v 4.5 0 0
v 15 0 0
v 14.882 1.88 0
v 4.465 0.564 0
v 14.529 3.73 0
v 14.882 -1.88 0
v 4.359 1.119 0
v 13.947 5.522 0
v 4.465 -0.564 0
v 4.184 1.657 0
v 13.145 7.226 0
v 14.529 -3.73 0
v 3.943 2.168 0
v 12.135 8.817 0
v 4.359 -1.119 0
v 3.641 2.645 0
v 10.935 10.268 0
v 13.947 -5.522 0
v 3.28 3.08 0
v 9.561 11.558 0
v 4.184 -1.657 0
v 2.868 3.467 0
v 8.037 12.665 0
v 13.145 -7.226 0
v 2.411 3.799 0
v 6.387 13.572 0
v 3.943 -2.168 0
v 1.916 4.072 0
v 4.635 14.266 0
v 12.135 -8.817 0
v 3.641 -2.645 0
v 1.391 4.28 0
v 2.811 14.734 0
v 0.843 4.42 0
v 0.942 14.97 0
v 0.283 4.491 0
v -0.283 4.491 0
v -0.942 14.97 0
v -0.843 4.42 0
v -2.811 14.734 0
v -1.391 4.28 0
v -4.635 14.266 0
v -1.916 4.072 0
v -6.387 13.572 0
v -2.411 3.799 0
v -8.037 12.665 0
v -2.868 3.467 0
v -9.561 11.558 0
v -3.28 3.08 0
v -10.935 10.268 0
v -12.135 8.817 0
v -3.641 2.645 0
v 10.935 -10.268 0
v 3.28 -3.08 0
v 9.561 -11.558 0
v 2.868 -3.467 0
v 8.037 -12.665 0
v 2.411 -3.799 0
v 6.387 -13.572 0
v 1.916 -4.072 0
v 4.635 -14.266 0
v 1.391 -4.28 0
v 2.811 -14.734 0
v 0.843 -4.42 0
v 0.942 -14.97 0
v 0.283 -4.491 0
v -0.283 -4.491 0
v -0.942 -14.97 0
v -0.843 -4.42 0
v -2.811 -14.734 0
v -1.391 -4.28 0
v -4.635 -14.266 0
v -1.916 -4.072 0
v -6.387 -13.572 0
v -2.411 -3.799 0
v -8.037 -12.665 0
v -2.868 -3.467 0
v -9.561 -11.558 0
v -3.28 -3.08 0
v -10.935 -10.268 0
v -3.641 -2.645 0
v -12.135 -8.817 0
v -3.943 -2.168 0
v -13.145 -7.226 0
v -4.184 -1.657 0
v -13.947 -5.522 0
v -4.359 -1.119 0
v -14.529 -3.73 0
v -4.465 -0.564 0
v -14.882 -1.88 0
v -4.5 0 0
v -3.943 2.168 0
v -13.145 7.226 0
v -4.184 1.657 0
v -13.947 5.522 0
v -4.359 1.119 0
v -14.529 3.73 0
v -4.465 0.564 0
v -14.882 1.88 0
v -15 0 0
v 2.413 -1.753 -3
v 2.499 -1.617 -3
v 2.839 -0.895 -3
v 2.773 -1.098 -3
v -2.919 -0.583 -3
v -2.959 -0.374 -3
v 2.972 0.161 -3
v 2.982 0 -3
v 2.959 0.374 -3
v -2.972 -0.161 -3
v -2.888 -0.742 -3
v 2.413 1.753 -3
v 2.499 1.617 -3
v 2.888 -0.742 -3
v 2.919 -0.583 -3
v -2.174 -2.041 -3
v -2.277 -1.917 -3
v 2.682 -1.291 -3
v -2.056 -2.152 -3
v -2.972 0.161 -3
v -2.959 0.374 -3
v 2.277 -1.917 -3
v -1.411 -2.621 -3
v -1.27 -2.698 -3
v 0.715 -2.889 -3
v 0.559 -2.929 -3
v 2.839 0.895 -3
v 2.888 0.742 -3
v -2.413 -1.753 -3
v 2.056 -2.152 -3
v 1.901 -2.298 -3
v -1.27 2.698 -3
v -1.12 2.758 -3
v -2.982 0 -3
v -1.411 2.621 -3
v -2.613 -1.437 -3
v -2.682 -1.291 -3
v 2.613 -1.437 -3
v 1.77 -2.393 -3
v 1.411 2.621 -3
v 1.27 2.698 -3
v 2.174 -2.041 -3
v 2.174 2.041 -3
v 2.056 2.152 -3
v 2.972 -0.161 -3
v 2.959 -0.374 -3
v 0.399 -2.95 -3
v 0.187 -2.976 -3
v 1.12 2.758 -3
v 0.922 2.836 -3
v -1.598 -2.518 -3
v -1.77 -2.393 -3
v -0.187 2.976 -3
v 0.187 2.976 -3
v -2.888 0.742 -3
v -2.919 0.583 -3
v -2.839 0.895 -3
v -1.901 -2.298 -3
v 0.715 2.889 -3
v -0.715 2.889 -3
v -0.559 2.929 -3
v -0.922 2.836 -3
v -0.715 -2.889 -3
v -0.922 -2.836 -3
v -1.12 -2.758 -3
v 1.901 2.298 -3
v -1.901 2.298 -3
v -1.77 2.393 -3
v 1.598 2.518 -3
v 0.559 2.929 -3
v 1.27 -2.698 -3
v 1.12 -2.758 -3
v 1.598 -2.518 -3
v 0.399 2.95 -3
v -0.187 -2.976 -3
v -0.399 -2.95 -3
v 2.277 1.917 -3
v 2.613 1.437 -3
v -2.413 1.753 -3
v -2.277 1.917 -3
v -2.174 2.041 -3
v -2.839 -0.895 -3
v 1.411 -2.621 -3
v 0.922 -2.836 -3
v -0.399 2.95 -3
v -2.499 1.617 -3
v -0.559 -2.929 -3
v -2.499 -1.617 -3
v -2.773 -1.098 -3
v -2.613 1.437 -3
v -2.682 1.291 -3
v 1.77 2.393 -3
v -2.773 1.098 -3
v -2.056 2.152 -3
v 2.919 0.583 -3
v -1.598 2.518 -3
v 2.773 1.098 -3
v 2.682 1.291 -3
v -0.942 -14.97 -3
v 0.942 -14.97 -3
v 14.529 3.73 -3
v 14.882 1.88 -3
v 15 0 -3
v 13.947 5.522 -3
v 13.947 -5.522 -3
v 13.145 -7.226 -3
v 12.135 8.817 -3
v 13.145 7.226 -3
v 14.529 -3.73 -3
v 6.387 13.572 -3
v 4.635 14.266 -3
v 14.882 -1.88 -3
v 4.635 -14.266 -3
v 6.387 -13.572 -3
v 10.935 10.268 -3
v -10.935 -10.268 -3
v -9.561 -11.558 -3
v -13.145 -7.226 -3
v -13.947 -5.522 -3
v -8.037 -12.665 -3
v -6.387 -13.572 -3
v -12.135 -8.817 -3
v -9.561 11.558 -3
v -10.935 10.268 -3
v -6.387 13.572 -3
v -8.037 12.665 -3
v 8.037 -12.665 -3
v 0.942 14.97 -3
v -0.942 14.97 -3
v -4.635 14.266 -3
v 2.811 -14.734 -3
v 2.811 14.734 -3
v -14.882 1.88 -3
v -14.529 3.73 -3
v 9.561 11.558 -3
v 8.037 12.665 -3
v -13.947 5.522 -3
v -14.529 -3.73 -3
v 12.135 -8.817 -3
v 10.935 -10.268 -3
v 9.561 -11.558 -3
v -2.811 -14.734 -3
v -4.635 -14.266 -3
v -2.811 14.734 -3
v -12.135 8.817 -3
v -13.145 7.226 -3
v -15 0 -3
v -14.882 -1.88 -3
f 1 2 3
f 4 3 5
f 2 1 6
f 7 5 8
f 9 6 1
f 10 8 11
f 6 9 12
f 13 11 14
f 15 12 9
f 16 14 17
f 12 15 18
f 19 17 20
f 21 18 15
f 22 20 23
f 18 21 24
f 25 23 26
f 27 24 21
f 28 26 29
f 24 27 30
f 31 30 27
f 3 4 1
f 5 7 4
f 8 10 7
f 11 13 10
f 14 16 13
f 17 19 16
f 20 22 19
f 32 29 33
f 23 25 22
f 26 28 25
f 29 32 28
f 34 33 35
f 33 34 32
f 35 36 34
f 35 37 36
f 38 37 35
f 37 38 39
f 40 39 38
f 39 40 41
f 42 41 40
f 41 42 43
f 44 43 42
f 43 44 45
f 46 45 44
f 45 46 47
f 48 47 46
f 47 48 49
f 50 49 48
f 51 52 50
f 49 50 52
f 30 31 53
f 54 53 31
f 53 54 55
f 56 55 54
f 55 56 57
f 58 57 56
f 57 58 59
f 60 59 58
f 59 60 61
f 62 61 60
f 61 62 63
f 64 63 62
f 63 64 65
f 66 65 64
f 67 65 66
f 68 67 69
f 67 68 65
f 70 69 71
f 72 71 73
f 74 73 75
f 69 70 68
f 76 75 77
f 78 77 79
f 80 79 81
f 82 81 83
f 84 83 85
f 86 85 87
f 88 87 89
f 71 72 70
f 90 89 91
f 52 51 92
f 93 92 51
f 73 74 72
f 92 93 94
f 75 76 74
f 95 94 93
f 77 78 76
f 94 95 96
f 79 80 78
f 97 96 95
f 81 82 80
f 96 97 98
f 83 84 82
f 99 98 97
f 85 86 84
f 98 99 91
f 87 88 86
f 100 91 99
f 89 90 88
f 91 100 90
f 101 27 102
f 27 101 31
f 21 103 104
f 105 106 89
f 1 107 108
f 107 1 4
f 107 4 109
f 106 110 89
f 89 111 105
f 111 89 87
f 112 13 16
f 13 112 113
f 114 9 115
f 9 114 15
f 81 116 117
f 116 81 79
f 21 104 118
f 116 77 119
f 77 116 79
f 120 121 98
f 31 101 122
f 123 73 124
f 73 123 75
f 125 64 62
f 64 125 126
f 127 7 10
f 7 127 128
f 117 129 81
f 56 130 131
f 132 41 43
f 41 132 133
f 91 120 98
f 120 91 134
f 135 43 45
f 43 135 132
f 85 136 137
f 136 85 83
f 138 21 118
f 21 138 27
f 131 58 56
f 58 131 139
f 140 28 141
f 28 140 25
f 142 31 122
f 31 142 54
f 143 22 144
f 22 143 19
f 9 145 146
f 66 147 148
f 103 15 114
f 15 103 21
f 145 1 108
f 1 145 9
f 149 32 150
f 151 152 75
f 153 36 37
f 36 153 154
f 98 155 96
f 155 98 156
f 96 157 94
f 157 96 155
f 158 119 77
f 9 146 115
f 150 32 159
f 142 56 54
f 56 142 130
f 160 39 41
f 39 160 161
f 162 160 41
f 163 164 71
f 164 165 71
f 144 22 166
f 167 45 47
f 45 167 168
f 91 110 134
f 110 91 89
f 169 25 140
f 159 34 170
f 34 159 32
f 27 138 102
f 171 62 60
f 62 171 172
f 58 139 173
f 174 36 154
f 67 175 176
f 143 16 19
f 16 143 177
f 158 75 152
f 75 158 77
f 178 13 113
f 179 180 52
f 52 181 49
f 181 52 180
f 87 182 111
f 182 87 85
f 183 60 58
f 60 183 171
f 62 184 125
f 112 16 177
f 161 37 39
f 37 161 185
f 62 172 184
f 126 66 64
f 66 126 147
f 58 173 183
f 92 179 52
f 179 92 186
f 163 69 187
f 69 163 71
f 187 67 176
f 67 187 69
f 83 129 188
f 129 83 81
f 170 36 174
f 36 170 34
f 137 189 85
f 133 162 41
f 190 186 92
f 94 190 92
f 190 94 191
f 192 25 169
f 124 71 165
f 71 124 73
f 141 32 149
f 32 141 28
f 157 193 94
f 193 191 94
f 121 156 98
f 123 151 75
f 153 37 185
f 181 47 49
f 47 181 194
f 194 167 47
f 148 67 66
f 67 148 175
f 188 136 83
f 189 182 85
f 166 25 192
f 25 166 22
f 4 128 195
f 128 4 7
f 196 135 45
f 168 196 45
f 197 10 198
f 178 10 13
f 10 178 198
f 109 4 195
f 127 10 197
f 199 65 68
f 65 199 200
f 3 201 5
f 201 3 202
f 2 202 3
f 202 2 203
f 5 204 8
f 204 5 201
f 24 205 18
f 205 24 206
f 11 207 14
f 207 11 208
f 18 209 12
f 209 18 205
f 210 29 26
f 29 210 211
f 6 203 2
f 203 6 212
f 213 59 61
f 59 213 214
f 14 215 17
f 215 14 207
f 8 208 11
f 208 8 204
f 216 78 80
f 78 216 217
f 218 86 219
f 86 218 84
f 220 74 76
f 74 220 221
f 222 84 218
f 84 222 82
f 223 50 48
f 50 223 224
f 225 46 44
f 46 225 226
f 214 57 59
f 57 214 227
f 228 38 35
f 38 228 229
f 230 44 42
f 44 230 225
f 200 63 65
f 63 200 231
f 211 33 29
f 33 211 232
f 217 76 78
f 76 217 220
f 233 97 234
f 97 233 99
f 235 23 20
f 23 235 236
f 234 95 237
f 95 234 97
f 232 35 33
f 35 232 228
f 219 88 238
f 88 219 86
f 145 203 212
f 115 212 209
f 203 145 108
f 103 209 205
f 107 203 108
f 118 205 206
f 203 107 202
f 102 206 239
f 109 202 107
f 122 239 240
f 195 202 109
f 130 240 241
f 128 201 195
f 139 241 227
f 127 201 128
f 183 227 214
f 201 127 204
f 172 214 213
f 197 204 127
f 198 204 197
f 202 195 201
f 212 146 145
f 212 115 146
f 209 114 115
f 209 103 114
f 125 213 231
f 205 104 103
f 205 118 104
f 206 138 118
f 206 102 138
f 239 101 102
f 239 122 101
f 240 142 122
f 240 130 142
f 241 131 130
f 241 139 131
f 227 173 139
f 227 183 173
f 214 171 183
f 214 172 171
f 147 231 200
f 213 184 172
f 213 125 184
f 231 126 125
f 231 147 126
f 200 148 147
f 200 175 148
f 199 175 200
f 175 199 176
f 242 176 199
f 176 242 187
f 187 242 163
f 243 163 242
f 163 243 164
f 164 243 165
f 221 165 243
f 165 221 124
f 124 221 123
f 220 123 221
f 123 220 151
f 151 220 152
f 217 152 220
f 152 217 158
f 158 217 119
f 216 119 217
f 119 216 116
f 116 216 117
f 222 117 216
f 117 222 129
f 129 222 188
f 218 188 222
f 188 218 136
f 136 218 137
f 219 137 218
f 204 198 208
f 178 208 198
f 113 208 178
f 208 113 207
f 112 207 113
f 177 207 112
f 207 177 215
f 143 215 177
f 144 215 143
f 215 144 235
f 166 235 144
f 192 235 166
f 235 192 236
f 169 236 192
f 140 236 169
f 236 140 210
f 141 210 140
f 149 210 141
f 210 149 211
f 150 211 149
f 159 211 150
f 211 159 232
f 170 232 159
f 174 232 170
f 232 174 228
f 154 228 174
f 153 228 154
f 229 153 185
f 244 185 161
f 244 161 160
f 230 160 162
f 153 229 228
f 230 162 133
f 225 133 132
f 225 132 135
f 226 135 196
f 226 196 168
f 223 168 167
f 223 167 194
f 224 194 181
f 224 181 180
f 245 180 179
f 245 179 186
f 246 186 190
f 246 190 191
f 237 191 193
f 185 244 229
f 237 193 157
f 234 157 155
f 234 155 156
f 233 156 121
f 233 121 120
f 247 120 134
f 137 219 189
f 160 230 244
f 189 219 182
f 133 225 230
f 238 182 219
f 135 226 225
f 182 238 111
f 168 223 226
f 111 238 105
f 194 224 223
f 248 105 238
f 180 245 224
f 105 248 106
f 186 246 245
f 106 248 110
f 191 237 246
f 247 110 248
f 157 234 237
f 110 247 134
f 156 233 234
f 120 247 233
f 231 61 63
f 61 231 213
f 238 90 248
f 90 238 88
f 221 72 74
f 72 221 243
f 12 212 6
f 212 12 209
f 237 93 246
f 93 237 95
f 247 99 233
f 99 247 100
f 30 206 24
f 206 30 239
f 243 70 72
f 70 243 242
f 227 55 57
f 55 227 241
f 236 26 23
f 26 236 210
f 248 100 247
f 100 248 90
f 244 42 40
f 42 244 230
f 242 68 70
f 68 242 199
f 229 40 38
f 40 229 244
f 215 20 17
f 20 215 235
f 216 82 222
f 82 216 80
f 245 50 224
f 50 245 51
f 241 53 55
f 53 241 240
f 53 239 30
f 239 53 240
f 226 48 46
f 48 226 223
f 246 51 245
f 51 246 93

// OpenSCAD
$fn = 50;

difference() {
	union() {
		translate(v = [0, 0, -3.0]) {
			cylinder(h = 3, r = 15.0);
		}
	}
	union() {
		translate(v = [0, 0, 0]) {
			rotate(a = [0, 0, 0]) {
				difference() {
					union() {
						translate(v = [0, 0, -6.0]) {
							cylinder(h = 6, r = 2.25);
						}
						translate(v = [0, 0, -4.2]) {
							cylinder(h = 4.2, r1 = 2.375, r2 = 4.5);
						}
						translate(v = [0, 0, -6.0]) {
							cylinder(h = 6, r = 2.375);
						}
						translate(v = [0, 0, -6.0]) {
							cylinder(h = 6, r = 2.25);
						}
					}
					union();
				}
			}
		}
	}
}
